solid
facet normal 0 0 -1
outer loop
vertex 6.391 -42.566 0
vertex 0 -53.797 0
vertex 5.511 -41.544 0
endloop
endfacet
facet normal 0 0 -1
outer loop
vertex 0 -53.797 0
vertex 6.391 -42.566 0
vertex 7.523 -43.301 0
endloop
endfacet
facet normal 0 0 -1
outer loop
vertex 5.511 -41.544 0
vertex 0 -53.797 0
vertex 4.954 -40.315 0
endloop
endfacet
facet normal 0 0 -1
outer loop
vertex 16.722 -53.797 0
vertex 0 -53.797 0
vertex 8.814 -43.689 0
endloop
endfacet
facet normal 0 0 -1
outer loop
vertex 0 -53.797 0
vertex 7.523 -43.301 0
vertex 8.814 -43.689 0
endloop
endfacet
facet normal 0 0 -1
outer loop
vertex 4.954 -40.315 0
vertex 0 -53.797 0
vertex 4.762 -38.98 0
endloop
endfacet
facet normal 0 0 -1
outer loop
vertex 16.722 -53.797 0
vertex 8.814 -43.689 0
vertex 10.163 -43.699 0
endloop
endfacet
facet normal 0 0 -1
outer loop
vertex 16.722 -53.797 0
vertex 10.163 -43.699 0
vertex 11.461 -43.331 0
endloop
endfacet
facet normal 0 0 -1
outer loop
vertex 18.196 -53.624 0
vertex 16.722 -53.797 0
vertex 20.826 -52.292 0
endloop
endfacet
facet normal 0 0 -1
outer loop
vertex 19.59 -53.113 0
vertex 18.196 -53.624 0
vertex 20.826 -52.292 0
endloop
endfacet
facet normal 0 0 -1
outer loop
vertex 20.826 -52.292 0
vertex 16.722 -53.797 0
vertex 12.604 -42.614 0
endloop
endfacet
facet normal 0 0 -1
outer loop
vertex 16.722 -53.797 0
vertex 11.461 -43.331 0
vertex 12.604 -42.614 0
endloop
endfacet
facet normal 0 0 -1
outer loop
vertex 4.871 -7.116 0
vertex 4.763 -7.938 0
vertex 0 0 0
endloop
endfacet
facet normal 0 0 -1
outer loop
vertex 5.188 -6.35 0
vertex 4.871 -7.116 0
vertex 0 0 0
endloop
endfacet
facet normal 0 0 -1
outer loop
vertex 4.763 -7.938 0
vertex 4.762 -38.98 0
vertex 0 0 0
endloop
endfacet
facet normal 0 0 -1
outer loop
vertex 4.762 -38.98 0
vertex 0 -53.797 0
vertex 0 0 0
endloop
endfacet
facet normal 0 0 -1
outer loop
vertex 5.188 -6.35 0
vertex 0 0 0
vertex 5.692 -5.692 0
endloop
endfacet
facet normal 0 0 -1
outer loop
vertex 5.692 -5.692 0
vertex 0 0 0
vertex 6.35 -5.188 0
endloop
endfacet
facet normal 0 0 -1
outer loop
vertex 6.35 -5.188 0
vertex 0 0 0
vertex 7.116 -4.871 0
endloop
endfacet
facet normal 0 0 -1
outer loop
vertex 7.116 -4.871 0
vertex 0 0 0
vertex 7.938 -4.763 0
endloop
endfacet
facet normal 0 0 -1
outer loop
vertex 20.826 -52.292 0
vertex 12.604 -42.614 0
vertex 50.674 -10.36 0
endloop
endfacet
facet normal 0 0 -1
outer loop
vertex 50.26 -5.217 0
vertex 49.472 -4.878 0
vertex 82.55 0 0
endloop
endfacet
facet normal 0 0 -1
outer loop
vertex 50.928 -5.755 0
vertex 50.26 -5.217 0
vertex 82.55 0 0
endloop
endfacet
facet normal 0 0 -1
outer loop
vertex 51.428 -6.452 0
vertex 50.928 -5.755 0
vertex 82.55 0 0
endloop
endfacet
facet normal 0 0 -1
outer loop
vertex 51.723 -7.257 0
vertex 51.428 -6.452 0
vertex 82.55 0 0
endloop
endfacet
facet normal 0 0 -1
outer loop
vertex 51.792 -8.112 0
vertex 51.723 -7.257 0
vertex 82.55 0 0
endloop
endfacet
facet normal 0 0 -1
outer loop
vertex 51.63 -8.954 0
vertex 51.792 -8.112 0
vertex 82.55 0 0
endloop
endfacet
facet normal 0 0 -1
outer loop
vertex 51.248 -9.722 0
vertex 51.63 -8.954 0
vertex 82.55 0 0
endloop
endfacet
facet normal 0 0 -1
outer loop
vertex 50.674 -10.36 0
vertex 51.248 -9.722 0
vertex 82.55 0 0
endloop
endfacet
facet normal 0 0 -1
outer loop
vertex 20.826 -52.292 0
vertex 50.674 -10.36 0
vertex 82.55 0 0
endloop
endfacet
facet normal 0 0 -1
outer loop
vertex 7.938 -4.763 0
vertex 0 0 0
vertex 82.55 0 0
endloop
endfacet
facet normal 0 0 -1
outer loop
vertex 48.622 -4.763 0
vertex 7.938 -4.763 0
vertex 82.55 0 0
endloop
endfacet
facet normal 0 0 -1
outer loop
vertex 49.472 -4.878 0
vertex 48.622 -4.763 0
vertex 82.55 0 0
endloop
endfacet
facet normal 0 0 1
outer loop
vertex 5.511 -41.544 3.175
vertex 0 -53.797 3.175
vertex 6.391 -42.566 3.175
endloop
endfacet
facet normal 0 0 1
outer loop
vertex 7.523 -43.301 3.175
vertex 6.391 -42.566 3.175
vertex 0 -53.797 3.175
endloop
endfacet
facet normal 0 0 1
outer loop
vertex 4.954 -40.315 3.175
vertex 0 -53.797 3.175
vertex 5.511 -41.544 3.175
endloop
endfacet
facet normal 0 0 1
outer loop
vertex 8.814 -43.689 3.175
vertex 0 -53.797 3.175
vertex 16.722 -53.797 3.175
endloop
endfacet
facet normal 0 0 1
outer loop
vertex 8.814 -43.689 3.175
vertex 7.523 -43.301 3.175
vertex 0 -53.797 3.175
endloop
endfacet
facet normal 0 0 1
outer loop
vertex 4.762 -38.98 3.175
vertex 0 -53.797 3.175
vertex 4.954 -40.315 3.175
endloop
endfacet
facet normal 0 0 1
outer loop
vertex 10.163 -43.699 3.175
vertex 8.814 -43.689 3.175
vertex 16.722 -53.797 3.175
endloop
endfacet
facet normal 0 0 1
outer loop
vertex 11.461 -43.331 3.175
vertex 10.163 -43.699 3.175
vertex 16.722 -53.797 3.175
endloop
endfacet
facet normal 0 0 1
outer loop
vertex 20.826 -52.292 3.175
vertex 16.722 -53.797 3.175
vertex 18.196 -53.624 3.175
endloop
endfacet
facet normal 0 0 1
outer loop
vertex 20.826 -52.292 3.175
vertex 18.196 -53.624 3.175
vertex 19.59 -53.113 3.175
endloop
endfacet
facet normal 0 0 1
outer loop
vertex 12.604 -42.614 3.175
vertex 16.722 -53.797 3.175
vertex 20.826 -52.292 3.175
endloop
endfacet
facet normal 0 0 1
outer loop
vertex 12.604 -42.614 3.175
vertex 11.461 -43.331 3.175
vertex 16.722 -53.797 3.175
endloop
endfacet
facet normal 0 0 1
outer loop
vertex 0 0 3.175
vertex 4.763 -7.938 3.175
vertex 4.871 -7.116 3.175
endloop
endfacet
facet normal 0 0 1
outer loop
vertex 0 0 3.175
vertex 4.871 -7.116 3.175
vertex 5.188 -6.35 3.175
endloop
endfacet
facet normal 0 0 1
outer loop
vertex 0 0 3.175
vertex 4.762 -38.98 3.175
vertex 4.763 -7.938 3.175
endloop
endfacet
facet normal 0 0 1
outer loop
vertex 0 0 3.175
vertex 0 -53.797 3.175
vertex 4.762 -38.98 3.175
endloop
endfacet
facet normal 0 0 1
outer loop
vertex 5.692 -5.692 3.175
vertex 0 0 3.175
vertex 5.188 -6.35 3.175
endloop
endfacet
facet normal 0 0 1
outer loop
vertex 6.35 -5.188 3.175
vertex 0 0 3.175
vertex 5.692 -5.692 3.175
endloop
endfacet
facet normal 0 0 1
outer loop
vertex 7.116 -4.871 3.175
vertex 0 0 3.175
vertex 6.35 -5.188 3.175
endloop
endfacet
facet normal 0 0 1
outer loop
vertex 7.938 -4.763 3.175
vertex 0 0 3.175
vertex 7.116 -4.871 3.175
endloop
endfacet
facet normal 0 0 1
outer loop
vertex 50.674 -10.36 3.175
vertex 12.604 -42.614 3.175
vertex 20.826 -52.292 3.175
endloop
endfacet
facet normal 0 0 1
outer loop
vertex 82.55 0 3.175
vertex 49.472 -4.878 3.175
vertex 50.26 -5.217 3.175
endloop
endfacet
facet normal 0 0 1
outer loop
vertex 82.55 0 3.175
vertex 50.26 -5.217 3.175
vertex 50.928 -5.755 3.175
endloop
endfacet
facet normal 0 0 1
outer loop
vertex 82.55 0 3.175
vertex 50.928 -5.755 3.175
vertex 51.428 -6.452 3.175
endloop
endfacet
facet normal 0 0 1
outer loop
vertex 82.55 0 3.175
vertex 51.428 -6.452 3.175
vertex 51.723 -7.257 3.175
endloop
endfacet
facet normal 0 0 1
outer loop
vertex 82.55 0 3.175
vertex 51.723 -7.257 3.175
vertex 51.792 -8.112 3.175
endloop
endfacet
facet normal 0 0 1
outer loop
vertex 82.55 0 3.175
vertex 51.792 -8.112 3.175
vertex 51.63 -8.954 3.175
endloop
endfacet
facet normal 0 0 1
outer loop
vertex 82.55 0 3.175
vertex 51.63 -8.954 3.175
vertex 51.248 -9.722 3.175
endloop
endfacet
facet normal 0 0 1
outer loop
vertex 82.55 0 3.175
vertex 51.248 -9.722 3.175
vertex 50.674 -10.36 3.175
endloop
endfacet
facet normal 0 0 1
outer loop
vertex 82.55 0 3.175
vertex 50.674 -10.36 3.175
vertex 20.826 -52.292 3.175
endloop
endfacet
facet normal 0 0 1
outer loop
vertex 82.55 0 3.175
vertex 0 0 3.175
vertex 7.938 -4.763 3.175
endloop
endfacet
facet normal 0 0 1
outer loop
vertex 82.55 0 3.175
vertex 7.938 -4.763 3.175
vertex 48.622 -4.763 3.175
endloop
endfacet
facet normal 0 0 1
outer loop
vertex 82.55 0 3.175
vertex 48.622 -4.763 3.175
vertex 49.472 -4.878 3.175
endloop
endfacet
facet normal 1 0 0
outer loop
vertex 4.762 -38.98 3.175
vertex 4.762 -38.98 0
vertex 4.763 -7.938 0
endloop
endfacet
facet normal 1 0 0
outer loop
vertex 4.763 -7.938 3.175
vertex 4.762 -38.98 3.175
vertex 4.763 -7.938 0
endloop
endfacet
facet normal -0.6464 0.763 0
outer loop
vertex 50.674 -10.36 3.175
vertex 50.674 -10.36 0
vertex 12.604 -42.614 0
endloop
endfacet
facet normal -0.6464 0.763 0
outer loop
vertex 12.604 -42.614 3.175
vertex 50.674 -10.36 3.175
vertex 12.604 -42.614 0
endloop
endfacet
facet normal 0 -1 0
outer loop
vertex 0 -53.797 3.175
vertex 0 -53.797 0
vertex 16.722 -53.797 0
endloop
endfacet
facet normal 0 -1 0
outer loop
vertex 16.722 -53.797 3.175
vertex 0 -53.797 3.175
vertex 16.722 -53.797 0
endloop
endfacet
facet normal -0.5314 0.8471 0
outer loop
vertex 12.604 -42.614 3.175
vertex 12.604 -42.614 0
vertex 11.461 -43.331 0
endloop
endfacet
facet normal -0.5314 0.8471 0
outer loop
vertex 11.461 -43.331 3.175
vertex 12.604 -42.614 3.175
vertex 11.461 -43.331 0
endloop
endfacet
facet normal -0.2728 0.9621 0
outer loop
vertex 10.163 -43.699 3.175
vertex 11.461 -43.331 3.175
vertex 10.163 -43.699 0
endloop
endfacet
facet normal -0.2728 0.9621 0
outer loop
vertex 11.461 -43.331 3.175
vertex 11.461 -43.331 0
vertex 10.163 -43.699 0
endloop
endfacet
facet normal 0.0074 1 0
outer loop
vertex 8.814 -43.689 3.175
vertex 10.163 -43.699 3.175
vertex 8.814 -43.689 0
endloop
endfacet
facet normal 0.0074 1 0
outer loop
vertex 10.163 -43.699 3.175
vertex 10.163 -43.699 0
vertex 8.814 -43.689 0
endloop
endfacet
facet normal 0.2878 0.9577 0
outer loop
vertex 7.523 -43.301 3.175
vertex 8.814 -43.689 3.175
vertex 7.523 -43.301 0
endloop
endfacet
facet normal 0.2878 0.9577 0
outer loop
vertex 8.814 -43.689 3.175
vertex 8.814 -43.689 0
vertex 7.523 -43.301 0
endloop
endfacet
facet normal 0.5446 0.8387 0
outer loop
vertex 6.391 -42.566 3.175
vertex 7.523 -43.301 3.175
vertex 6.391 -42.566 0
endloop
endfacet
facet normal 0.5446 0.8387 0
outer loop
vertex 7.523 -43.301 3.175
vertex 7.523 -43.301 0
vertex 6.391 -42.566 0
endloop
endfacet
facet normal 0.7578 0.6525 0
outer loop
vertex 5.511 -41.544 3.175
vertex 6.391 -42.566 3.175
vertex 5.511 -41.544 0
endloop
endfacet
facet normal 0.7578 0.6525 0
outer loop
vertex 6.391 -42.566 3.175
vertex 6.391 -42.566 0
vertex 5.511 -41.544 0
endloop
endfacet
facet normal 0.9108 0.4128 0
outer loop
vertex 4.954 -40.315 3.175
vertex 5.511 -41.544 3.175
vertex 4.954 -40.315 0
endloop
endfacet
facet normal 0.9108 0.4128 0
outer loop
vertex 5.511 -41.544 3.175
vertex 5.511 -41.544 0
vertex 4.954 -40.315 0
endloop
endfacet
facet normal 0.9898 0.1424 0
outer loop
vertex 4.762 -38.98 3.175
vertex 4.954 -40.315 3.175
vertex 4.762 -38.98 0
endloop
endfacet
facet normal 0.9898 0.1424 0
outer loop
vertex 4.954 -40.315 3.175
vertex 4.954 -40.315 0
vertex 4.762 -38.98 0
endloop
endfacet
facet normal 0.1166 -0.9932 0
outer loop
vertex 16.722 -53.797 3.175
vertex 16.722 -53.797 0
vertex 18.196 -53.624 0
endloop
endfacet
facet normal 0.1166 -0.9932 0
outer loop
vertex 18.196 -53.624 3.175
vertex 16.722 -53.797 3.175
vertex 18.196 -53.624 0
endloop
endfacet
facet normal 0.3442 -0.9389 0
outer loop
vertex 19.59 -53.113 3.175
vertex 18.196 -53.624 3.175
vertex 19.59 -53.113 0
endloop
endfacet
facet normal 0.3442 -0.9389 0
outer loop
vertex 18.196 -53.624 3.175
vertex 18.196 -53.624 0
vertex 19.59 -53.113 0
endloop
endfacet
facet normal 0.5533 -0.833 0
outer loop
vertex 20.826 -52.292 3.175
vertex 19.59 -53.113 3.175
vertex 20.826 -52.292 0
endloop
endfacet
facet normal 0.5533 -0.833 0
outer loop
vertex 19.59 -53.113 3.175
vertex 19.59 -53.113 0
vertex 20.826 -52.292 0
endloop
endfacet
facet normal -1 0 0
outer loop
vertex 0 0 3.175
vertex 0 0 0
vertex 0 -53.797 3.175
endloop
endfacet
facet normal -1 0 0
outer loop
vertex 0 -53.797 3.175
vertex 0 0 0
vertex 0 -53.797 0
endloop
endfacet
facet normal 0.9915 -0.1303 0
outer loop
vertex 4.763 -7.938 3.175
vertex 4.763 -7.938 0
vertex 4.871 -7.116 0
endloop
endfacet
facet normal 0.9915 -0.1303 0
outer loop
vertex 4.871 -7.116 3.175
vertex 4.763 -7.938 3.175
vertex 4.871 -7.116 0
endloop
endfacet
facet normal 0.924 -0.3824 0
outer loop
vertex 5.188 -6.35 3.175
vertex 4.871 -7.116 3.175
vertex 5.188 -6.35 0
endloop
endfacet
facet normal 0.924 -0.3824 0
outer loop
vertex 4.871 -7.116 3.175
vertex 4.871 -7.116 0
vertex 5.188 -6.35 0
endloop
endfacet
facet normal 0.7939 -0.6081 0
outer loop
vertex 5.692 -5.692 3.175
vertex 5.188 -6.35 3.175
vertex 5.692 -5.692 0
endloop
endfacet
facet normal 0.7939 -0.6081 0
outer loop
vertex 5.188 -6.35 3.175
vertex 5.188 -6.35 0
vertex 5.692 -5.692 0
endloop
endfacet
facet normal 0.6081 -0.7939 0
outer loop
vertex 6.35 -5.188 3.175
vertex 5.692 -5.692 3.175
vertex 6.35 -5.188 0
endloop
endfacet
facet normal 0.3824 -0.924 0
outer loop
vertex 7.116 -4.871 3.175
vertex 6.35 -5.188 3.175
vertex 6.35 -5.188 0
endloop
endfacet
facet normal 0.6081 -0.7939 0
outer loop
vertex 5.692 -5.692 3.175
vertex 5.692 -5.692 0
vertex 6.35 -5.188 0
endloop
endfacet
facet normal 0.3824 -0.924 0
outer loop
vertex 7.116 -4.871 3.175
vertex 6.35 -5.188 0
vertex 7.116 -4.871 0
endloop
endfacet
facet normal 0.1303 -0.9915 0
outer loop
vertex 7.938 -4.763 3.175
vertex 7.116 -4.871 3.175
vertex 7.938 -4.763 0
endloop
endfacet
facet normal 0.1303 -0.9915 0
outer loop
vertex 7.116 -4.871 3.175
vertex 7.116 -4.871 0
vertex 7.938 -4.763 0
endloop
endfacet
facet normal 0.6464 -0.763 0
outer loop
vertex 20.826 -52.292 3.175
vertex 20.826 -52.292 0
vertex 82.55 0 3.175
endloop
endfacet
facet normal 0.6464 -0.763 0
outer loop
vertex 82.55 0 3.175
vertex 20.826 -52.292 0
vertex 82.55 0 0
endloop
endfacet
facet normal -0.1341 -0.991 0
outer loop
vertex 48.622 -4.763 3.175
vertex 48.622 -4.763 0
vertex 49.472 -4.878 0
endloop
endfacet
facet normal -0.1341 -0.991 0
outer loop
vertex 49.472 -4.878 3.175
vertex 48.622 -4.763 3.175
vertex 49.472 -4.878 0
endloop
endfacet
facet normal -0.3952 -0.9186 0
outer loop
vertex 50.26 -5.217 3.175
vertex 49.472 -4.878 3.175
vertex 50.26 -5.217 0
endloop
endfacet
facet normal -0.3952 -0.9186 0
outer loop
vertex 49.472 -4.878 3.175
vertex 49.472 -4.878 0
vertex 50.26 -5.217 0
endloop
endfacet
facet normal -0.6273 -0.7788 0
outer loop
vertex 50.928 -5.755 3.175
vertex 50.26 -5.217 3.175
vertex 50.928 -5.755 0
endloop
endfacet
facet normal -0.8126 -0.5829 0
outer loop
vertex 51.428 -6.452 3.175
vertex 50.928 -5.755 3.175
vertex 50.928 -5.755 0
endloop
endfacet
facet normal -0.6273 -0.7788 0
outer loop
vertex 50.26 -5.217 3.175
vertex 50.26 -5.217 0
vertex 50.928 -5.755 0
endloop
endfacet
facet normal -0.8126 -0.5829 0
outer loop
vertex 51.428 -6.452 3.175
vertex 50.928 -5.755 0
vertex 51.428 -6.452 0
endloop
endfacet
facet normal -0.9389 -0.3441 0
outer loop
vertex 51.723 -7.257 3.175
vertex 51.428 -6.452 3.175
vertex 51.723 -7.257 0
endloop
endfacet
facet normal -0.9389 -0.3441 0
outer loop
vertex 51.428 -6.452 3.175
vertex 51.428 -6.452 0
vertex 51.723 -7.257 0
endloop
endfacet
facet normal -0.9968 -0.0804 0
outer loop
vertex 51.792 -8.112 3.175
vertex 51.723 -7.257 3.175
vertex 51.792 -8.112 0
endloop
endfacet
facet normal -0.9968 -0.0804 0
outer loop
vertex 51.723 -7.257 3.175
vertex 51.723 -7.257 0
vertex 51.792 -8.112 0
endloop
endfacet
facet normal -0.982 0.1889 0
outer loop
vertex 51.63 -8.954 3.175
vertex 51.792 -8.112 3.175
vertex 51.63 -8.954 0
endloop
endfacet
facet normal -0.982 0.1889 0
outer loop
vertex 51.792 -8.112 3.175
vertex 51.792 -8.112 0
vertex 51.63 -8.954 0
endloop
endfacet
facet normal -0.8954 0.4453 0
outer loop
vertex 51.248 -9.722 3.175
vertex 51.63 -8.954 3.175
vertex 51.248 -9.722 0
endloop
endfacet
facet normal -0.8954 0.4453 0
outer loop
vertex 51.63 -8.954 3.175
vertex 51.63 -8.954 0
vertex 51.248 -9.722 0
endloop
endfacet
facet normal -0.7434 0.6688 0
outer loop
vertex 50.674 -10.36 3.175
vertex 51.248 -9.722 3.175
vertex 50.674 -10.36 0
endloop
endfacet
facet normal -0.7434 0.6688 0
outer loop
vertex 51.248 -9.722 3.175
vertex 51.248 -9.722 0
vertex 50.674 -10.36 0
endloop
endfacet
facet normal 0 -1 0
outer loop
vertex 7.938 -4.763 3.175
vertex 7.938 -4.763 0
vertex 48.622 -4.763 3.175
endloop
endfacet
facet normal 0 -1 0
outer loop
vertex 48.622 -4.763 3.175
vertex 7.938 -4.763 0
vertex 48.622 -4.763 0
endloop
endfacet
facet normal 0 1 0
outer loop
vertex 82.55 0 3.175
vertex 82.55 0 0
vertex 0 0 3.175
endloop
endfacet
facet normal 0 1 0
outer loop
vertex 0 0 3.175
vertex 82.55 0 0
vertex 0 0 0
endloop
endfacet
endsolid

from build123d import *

# Parameters (mm, degrees)
BOSS_EXTRUDE1_DEPTH = 3.175


with BuildPart() as part:
    # Sketch1 → Boss-Extrude1 (new body)
    with BuildSketch(Plane.XY):
        with BuildLine():
            Line((0, 0), (0, -53.7972))
            Line((0, -53.7972), (16.721750646, -53.7972))
            ThreePointArc((16.721750646, -53.7972), (18.907698166, -53.40909009), (20.826436899, -52.292202659))
            Line((20.826436899, -52.292202659), (82.55, 0))
            Line((82.55, 0), (0, 0))
        make_face()
        with BuildLine():
            Line((7.9375, -4.7625), (48.622081998, -4.7625))
            ThreePointArc((48.622081998, -4.7625), (51.603027043, -6.84452624), (50.674425125, -10.36000133))
            Line((50.674425125, -10.36000133), (12.60351469, -42.61367665))
            ThreePointArc((12.60351469, -42.61367665), (7.522504052, -43.300968075), (4.7625, -38.979924656))
            Line((4.7625, -38.979924656), (4.7625, -7.9375))
            ThreePointArc((4.7625, -7.9375), (5.69243597, -5.69243597), (7.9375, -4.7625))
        make_face(mode=Mode.SUBTRACT)
    extrude(amount=BOSS_EXTRUDE1_DEPTH)


solid = part.part
